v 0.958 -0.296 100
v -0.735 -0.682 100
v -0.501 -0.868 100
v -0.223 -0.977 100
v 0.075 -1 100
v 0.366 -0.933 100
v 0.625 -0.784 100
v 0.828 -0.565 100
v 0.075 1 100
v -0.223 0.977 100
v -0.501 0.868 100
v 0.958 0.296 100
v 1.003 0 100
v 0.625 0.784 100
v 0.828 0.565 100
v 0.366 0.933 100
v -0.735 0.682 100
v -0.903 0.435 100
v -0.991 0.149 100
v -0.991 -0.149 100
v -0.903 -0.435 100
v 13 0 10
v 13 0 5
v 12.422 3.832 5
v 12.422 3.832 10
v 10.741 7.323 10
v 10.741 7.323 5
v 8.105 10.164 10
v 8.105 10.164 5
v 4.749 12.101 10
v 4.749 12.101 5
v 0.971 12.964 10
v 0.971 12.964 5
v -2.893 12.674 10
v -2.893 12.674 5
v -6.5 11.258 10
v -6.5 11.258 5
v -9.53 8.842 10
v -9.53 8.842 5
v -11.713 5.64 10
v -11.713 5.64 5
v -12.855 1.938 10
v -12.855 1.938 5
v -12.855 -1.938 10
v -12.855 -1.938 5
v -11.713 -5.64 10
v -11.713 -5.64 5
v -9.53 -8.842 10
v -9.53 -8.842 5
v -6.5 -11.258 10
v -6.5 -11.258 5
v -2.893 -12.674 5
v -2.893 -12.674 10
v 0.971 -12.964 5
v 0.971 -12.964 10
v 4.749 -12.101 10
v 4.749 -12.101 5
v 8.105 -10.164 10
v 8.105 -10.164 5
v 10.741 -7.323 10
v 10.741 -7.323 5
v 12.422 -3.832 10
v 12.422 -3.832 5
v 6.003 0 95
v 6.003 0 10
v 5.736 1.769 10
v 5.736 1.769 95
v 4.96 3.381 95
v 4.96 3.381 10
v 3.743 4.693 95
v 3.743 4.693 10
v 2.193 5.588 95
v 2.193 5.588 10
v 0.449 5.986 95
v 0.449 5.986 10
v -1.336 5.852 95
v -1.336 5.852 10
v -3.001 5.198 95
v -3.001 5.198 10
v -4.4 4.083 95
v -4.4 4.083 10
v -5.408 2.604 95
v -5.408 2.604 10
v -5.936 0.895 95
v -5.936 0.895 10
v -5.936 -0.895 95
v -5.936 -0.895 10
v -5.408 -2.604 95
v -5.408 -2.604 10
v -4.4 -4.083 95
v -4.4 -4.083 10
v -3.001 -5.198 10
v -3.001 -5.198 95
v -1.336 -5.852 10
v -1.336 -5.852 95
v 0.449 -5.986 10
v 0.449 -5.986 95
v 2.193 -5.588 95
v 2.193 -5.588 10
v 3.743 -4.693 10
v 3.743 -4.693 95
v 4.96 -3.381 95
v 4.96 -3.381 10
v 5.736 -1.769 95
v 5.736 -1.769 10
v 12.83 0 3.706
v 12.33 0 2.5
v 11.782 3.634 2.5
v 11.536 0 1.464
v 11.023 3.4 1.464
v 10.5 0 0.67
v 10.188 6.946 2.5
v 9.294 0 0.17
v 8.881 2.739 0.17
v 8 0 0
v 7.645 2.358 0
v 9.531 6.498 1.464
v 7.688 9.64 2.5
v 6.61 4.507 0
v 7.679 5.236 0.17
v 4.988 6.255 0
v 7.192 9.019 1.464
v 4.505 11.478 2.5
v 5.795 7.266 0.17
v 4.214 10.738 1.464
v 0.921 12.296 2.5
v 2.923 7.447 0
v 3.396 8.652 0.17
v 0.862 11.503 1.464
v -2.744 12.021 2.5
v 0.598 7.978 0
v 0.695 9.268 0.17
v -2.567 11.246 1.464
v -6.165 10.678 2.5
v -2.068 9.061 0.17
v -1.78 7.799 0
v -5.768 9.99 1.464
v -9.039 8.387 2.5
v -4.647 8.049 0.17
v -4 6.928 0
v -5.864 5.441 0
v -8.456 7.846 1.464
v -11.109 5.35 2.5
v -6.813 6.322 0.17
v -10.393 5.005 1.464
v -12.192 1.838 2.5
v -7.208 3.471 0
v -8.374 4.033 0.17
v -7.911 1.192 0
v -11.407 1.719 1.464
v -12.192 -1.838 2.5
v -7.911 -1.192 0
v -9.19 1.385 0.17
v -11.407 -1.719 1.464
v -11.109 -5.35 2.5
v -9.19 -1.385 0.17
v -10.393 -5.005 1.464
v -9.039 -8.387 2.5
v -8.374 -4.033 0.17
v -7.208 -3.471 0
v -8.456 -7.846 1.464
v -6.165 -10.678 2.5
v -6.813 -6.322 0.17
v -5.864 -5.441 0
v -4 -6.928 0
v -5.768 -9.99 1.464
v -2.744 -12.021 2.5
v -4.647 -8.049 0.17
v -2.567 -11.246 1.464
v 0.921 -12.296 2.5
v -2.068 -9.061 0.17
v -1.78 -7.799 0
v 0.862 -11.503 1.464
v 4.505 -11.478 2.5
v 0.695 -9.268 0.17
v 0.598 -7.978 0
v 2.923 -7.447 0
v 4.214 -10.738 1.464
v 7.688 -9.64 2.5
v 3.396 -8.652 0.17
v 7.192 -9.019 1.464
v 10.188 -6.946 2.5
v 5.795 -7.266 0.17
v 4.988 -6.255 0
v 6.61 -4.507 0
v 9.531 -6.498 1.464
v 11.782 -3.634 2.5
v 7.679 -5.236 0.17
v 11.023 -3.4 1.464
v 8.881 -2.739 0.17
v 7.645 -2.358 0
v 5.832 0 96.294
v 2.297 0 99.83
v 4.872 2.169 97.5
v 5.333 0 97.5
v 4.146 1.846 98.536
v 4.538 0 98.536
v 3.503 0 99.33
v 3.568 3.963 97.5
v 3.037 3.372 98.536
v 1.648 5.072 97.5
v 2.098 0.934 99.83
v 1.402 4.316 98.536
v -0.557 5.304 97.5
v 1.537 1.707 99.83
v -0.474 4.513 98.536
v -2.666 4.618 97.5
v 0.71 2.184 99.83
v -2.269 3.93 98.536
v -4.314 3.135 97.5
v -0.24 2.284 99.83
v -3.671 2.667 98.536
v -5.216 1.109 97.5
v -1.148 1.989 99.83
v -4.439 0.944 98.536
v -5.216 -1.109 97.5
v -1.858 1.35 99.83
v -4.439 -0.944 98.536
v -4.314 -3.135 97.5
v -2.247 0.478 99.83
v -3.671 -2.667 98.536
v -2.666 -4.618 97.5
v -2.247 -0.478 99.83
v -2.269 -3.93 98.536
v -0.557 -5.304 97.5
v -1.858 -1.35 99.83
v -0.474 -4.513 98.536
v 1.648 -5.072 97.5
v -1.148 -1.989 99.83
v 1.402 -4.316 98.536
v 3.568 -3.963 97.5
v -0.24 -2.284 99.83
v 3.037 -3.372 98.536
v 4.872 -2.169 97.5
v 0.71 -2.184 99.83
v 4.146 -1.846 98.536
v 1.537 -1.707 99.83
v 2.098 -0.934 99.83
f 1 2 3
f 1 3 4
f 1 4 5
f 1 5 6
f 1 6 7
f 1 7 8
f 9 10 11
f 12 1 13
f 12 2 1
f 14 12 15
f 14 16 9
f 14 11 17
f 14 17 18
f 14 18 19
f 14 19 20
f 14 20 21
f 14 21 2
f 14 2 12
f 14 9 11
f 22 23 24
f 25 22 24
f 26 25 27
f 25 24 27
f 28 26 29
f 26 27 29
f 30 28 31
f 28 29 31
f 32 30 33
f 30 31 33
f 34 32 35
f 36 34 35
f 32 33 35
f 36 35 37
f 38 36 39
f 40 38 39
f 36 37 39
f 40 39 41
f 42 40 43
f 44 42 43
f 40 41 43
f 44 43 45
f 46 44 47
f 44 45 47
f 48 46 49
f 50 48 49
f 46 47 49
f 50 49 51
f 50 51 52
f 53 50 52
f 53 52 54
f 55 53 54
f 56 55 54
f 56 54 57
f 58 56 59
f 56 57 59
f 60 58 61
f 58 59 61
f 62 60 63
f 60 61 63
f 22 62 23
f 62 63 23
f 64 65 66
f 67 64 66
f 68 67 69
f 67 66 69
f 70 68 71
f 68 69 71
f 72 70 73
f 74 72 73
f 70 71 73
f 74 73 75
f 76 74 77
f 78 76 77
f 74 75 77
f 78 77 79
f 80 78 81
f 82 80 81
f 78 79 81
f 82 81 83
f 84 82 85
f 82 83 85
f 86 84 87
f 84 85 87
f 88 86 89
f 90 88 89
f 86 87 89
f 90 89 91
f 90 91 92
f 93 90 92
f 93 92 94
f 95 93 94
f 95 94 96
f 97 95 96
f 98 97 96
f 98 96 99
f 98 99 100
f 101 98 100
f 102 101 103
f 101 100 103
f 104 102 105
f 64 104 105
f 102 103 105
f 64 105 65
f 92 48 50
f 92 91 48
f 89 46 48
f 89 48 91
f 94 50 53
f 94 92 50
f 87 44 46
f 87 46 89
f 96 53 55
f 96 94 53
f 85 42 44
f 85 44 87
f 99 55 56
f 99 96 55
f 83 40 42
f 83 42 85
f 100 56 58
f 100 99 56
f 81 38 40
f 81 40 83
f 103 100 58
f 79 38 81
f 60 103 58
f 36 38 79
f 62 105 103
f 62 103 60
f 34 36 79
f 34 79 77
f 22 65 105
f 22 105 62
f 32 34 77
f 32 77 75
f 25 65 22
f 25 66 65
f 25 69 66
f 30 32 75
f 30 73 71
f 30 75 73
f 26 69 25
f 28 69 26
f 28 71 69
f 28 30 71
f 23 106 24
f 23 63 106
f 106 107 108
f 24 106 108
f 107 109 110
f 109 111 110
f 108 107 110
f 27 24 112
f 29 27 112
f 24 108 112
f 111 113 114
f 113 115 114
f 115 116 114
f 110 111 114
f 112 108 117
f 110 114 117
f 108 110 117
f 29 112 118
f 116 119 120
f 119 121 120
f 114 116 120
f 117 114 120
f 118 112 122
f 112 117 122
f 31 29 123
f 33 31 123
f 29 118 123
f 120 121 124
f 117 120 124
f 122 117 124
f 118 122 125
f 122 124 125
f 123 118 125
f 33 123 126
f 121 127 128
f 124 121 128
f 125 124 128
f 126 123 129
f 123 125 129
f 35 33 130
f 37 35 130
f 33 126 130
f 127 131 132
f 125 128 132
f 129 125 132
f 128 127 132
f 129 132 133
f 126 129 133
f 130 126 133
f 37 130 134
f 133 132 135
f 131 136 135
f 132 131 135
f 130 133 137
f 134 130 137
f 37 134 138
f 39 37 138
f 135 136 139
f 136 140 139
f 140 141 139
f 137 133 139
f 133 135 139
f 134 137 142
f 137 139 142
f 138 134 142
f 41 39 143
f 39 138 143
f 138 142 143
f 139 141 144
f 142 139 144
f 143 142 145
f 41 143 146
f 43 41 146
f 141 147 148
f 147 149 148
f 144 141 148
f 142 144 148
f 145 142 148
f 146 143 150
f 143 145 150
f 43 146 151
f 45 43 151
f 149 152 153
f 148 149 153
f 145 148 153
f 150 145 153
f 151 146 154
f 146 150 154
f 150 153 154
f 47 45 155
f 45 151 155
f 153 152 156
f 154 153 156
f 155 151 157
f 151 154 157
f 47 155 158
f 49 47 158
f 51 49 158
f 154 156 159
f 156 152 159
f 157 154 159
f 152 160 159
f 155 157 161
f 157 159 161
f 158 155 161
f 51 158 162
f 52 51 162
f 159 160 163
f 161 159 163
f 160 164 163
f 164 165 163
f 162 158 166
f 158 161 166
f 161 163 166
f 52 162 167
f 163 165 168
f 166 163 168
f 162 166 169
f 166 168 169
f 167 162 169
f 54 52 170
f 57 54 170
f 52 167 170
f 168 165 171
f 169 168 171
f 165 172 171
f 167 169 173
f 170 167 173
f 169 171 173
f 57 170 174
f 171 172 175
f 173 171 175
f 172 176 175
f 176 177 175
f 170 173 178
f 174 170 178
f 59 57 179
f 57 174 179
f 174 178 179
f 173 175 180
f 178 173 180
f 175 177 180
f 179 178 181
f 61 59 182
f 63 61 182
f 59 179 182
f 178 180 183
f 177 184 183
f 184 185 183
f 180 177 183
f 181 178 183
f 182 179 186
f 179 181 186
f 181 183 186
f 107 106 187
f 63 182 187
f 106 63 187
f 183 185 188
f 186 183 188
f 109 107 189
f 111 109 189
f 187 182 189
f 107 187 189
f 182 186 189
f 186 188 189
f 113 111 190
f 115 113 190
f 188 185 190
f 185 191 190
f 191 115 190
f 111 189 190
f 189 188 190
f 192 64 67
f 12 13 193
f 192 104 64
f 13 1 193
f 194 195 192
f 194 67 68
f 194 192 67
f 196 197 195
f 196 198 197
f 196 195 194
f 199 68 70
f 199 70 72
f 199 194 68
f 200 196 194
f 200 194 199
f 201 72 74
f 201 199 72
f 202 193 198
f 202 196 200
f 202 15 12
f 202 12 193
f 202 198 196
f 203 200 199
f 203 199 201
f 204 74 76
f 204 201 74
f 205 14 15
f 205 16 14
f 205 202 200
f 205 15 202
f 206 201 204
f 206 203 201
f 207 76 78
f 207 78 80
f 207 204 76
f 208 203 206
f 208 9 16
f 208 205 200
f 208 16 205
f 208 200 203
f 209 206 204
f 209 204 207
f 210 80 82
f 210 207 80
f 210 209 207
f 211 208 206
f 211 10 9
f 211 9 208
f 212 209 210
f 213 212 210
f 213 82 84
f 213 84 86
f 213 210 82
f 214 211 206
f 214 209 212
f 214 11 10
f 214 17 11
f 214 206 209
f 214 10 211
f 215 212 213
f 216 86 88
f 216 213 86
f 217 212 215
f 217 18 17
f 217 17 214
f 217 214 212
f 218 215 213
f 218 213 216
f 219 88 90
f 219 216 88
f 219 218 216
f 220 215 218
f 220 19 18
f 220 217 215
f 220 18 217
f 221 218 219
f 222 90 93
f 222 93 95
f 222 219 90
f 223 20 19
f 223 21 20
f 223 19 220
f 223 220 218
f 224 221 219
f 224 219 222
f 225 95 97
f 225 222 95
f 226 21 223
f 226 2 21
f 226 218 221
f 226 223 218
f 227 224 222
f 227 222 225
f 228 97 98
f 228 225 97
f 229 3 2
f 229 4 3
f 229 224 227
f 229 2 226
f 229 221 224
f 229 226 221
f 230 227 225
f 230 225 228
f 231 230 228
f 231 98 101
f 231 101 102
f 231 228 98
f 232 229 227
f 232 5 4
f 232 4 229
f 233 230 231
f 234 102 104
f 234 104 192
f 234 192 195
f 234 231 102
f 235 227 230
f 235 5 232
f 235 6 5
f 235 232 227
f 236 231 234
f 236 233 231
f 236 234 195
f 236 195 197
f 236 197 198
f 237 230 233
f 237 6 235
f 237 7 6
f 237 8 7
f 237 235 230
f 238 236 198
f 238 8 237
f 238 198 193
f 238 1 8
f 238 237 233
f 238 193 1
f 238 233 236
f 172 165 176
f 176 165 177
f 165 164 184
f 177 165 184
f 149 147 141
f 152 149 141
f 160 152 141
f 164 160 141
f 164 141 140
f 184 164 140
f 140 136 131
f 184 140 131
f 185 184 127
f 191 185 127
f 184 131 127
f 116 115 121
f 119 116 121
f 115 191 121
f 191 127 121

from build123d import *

# Parameters (mm, degrees)
F0_R     = 13
F1_DEPTH = 10
F2_R     = 6.002605
F3_DEPTH = 90
F4_R     = 5
F5_R     = 5


with BuildPart() as f1:
    # F0 (on Top) → F1 (new body)
    with BuildSketch(Plane.XY):
        Circle(F0_R)
    extrude(amount=F1_DEPTH)

    # F2 (on face) → F3 (join)
    with BuildSketch(Plane.XY.offset(10)):
        Circle(F2_R)
    extrude(amount=F3_DEPTH)

    # F4
    f4_edges = [f1.edges().sort_by_distance(p)[0] for p in [
        (-13, 0, 0),
    ]]
    fillet(f4_edges, radius=F4_R)

    # F5
    f5_edges = [f1.edges().sort_by_distance(p)[0] for p in [
        (-6.002605, 0, 100),
    ]]
    fillet(f5_edges, radius=F5_R)


solid = f1.part
